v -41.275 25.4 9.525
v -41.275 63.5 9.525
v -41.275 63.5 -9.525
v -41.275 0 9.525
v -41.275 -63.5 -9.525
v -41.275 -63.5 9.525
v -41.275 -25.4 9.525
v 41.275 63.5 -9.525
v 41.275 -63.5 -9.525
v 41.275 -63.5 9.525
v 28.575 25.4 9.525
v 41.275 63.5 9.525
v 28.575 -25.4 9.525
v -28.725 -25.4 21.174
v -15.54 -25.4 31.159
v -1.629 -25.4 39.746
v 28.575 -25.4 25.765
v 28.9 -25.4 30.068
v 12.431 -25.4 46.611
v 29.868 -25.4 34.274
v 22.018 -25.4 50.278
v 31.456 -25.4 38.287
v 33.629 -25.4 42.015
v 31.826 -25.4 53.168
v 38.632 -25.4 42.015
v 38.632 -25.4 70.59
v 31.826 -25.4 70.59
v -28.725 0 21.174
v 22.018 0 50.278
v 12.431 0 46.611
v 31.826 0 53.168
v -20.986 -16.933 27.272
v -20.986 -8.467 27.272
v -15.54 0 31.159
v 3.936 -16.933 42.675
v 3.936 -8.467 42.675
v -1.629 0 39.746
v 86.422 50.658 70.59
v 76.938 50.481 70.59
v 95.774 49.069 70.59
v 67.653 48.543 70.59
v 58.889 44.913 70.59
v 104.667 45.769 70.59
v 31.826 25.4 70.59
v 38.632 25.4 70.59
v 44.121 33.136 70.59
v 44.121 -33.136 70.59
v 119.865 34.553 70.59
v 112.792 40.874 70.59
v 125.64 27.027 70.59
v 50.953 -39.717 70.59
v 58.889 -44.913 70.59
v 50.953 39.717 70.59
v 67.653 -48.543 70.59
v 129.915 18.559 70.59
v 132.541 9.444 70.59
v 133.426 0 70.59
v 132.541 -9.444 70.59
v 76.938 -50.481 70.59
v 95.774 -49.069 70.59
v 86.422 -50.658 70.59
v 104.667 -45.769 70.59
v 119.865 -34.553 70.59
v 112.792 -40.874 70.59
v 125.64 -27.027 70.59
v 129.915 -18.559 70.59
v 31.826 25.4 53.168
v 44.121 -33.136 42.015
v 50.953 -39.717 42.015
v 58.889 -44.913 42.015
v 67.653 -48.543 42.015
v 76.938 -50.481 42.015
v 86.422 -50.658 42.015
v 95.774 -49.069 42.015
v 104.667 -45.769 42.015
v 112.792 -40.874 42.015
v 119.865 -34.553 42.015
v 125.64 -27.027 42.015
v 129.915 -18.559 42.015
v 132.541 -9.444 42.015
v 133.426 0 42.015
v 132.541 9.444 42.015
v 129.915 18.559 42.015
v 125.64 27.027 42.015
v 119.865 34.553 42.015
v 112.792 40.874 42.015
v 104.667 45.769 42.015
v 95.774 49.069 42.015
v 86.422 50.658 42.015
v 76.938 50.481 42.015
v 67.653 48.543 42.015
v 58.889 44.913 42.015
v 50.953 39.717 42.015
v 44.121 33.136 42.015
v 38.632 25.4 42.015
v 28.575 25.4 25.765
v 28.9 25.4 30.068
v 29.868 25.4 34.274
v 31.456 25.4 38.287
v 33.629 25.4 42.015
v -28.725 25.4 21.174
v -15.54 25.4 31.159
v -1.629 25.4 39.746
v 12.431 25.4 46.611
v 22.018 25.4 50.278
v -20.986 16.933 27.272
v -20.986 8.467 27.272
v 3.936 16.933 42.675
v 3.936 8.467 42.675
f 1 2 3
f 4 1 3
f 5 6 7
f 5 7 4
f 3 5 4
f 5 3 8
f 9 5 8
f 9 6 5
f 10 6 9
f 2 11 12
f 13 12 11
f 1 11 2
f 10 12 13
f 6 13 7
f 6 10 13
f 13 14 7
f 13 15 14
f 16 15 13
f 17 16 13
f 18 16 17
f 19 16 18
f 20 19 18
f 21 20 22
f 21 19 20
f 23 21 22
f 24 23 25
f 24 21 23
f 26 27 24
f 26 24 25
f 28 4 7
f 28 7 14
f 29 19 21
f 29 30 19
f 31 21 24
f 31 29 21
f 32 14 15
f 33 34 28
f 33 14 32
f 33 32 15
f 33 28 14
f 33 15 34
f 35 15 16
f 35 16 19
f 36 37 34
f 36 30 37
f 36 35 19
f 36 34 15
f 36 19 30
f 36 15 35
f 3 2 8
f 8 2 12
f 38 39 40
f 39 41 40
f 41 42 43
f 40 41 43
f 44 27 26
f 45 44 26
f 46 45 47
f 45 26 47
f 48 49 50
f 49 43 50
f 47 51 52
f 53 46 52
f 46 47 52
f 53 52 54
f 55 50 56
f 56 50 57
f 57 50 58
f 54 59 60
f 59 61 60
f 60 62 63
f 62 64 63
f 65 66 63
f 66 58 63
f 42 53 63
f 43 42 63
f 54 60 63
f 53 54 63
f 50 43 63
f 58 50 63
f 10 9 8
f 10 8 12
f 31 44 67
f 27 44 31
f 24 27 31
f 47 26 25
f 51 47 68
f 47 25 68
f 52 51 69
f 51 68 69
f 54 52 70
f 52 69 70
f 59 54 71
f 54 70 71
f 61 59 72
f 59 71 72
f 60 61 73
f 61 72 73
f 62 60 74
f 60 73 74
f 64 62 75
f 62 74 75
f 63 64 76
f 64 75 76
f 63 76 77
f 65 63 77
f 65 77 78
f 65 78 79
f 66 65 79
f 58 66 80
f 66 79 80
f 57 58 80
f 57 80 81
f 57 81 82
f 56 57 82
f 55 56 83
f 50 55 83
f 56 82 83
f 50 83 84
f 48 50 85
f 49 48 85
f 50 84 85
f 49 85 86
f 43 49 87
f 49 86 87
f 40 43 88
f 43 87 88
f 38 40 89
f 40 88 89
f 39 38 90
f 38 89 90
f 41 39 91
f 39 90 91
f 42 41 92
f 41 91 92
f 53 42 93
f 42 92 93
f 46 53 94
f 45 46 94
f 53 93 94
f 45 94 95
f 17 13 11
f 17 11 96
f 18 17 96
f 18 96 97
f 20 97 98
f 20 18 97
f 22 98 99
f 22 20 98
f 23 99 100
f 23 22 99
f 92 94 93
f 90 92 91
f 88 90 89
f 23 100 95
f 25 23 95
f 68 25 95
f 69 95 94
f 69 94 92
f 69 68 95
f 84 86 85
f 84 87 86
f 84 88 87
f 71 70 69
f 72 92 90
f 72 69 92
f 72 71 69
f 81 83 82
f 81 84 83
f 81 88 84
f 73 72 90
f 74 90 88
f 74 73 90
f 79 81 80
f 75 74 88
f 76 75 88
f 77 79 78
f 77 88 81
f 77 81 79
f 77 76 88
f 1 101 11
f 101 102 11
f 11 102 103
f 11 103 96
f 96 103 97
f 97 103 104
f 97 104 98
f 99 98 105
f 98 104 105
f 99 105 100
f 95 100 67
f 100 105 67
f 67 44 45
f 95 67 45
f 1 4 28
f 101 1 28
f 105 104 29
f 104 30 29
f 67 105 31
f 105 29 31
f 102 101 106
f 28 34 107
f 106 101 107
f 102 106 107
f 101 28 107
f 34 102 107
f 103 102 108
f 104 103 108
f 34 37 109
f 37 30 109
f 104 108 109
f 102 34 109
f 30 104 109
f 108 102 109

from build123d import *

# Parameters (mm, degrees)
F1_DEPTH = 63.5
F2_DEPTH = 25.4
F3_DEPTH = 25.4


# Not quite as in the source:
# - a feature names something its author has since deleted; it is built from what else it names


with BuildPart() as f1:
    # F0 (on Front) → F1 (new body, symmetric)
    with BuildSketch(Plane.XZ):
        Polygon((28.5749990565, 9.525), (-41.275, 9.525), (-41.275, -9.525), (41.275, -9.525), (41.275, 9.525), align=None)
    extrude(amount=F1_DEPTH, both=True)

    # F0 (on Front) → F2 (join, symmetric)
    with BuildSketch(Plane.XZ):
        with BuildLine():
            add(Edge.make_bspline(
                [(-41.275, 9.525), (-23.8584346144, 27.5869780948), (3.0069667421, 45.9865968148), (31.8262, 53.1677247911)],
                knots=[0, 0, 0, 0, 84.5177049164, 84.5177049164, 84.5177049164, 84.5177049164], degree=3))
            Line((-41.275, 9.525), (28.5749990565, 9.525))
            Line((28.5749990565, 9.525), (28.5749990565, 25.7647229111))
            ThreePointArc((28.5749990565, 25.7647229111), (29.8677699589, 34.2739896946), (33.6294204286, 42.0153631867))
            Line((33.6294204286, 42.0153631867), (31.8262, 42.0153631867))
            Line((31.8262, 42.0153631867), (31.8262, 53.1677247911))
        make_face()
    extrude(amount=F2_DEPTH, both=True)

    # F0 (on Front) → F3 (join, symmetric)
    with BuildSketch(Plane.XZ):
        Polygon((31.8262, 70.5903631867), (31.8262, 53.1677247911), (31.8262, 42.0153631867), (33.6294204286, 42.0153631867), (82.6262, 42.0153631867), (82.6262, 70.5903631867), align=None)
    extrude(amount=F3_DEPTH, both=True)

    # F0 (on Front) → F6 (revolve)
    with BuildSketch(Plane.XZ):
        Polygon((31.8262, 70.5903631867), (31.8262, 53.1677247911), (31.8262, 42.0153631867), (33.6294204286, 42.0153631867), (82.6262, 42.0153631867), (82.6262, 70.5903631867), align=None)
    revolve(axis=Axis((82.6262, 0, 56.3028631867), (0, 0, 1)))


solid = f1.part
